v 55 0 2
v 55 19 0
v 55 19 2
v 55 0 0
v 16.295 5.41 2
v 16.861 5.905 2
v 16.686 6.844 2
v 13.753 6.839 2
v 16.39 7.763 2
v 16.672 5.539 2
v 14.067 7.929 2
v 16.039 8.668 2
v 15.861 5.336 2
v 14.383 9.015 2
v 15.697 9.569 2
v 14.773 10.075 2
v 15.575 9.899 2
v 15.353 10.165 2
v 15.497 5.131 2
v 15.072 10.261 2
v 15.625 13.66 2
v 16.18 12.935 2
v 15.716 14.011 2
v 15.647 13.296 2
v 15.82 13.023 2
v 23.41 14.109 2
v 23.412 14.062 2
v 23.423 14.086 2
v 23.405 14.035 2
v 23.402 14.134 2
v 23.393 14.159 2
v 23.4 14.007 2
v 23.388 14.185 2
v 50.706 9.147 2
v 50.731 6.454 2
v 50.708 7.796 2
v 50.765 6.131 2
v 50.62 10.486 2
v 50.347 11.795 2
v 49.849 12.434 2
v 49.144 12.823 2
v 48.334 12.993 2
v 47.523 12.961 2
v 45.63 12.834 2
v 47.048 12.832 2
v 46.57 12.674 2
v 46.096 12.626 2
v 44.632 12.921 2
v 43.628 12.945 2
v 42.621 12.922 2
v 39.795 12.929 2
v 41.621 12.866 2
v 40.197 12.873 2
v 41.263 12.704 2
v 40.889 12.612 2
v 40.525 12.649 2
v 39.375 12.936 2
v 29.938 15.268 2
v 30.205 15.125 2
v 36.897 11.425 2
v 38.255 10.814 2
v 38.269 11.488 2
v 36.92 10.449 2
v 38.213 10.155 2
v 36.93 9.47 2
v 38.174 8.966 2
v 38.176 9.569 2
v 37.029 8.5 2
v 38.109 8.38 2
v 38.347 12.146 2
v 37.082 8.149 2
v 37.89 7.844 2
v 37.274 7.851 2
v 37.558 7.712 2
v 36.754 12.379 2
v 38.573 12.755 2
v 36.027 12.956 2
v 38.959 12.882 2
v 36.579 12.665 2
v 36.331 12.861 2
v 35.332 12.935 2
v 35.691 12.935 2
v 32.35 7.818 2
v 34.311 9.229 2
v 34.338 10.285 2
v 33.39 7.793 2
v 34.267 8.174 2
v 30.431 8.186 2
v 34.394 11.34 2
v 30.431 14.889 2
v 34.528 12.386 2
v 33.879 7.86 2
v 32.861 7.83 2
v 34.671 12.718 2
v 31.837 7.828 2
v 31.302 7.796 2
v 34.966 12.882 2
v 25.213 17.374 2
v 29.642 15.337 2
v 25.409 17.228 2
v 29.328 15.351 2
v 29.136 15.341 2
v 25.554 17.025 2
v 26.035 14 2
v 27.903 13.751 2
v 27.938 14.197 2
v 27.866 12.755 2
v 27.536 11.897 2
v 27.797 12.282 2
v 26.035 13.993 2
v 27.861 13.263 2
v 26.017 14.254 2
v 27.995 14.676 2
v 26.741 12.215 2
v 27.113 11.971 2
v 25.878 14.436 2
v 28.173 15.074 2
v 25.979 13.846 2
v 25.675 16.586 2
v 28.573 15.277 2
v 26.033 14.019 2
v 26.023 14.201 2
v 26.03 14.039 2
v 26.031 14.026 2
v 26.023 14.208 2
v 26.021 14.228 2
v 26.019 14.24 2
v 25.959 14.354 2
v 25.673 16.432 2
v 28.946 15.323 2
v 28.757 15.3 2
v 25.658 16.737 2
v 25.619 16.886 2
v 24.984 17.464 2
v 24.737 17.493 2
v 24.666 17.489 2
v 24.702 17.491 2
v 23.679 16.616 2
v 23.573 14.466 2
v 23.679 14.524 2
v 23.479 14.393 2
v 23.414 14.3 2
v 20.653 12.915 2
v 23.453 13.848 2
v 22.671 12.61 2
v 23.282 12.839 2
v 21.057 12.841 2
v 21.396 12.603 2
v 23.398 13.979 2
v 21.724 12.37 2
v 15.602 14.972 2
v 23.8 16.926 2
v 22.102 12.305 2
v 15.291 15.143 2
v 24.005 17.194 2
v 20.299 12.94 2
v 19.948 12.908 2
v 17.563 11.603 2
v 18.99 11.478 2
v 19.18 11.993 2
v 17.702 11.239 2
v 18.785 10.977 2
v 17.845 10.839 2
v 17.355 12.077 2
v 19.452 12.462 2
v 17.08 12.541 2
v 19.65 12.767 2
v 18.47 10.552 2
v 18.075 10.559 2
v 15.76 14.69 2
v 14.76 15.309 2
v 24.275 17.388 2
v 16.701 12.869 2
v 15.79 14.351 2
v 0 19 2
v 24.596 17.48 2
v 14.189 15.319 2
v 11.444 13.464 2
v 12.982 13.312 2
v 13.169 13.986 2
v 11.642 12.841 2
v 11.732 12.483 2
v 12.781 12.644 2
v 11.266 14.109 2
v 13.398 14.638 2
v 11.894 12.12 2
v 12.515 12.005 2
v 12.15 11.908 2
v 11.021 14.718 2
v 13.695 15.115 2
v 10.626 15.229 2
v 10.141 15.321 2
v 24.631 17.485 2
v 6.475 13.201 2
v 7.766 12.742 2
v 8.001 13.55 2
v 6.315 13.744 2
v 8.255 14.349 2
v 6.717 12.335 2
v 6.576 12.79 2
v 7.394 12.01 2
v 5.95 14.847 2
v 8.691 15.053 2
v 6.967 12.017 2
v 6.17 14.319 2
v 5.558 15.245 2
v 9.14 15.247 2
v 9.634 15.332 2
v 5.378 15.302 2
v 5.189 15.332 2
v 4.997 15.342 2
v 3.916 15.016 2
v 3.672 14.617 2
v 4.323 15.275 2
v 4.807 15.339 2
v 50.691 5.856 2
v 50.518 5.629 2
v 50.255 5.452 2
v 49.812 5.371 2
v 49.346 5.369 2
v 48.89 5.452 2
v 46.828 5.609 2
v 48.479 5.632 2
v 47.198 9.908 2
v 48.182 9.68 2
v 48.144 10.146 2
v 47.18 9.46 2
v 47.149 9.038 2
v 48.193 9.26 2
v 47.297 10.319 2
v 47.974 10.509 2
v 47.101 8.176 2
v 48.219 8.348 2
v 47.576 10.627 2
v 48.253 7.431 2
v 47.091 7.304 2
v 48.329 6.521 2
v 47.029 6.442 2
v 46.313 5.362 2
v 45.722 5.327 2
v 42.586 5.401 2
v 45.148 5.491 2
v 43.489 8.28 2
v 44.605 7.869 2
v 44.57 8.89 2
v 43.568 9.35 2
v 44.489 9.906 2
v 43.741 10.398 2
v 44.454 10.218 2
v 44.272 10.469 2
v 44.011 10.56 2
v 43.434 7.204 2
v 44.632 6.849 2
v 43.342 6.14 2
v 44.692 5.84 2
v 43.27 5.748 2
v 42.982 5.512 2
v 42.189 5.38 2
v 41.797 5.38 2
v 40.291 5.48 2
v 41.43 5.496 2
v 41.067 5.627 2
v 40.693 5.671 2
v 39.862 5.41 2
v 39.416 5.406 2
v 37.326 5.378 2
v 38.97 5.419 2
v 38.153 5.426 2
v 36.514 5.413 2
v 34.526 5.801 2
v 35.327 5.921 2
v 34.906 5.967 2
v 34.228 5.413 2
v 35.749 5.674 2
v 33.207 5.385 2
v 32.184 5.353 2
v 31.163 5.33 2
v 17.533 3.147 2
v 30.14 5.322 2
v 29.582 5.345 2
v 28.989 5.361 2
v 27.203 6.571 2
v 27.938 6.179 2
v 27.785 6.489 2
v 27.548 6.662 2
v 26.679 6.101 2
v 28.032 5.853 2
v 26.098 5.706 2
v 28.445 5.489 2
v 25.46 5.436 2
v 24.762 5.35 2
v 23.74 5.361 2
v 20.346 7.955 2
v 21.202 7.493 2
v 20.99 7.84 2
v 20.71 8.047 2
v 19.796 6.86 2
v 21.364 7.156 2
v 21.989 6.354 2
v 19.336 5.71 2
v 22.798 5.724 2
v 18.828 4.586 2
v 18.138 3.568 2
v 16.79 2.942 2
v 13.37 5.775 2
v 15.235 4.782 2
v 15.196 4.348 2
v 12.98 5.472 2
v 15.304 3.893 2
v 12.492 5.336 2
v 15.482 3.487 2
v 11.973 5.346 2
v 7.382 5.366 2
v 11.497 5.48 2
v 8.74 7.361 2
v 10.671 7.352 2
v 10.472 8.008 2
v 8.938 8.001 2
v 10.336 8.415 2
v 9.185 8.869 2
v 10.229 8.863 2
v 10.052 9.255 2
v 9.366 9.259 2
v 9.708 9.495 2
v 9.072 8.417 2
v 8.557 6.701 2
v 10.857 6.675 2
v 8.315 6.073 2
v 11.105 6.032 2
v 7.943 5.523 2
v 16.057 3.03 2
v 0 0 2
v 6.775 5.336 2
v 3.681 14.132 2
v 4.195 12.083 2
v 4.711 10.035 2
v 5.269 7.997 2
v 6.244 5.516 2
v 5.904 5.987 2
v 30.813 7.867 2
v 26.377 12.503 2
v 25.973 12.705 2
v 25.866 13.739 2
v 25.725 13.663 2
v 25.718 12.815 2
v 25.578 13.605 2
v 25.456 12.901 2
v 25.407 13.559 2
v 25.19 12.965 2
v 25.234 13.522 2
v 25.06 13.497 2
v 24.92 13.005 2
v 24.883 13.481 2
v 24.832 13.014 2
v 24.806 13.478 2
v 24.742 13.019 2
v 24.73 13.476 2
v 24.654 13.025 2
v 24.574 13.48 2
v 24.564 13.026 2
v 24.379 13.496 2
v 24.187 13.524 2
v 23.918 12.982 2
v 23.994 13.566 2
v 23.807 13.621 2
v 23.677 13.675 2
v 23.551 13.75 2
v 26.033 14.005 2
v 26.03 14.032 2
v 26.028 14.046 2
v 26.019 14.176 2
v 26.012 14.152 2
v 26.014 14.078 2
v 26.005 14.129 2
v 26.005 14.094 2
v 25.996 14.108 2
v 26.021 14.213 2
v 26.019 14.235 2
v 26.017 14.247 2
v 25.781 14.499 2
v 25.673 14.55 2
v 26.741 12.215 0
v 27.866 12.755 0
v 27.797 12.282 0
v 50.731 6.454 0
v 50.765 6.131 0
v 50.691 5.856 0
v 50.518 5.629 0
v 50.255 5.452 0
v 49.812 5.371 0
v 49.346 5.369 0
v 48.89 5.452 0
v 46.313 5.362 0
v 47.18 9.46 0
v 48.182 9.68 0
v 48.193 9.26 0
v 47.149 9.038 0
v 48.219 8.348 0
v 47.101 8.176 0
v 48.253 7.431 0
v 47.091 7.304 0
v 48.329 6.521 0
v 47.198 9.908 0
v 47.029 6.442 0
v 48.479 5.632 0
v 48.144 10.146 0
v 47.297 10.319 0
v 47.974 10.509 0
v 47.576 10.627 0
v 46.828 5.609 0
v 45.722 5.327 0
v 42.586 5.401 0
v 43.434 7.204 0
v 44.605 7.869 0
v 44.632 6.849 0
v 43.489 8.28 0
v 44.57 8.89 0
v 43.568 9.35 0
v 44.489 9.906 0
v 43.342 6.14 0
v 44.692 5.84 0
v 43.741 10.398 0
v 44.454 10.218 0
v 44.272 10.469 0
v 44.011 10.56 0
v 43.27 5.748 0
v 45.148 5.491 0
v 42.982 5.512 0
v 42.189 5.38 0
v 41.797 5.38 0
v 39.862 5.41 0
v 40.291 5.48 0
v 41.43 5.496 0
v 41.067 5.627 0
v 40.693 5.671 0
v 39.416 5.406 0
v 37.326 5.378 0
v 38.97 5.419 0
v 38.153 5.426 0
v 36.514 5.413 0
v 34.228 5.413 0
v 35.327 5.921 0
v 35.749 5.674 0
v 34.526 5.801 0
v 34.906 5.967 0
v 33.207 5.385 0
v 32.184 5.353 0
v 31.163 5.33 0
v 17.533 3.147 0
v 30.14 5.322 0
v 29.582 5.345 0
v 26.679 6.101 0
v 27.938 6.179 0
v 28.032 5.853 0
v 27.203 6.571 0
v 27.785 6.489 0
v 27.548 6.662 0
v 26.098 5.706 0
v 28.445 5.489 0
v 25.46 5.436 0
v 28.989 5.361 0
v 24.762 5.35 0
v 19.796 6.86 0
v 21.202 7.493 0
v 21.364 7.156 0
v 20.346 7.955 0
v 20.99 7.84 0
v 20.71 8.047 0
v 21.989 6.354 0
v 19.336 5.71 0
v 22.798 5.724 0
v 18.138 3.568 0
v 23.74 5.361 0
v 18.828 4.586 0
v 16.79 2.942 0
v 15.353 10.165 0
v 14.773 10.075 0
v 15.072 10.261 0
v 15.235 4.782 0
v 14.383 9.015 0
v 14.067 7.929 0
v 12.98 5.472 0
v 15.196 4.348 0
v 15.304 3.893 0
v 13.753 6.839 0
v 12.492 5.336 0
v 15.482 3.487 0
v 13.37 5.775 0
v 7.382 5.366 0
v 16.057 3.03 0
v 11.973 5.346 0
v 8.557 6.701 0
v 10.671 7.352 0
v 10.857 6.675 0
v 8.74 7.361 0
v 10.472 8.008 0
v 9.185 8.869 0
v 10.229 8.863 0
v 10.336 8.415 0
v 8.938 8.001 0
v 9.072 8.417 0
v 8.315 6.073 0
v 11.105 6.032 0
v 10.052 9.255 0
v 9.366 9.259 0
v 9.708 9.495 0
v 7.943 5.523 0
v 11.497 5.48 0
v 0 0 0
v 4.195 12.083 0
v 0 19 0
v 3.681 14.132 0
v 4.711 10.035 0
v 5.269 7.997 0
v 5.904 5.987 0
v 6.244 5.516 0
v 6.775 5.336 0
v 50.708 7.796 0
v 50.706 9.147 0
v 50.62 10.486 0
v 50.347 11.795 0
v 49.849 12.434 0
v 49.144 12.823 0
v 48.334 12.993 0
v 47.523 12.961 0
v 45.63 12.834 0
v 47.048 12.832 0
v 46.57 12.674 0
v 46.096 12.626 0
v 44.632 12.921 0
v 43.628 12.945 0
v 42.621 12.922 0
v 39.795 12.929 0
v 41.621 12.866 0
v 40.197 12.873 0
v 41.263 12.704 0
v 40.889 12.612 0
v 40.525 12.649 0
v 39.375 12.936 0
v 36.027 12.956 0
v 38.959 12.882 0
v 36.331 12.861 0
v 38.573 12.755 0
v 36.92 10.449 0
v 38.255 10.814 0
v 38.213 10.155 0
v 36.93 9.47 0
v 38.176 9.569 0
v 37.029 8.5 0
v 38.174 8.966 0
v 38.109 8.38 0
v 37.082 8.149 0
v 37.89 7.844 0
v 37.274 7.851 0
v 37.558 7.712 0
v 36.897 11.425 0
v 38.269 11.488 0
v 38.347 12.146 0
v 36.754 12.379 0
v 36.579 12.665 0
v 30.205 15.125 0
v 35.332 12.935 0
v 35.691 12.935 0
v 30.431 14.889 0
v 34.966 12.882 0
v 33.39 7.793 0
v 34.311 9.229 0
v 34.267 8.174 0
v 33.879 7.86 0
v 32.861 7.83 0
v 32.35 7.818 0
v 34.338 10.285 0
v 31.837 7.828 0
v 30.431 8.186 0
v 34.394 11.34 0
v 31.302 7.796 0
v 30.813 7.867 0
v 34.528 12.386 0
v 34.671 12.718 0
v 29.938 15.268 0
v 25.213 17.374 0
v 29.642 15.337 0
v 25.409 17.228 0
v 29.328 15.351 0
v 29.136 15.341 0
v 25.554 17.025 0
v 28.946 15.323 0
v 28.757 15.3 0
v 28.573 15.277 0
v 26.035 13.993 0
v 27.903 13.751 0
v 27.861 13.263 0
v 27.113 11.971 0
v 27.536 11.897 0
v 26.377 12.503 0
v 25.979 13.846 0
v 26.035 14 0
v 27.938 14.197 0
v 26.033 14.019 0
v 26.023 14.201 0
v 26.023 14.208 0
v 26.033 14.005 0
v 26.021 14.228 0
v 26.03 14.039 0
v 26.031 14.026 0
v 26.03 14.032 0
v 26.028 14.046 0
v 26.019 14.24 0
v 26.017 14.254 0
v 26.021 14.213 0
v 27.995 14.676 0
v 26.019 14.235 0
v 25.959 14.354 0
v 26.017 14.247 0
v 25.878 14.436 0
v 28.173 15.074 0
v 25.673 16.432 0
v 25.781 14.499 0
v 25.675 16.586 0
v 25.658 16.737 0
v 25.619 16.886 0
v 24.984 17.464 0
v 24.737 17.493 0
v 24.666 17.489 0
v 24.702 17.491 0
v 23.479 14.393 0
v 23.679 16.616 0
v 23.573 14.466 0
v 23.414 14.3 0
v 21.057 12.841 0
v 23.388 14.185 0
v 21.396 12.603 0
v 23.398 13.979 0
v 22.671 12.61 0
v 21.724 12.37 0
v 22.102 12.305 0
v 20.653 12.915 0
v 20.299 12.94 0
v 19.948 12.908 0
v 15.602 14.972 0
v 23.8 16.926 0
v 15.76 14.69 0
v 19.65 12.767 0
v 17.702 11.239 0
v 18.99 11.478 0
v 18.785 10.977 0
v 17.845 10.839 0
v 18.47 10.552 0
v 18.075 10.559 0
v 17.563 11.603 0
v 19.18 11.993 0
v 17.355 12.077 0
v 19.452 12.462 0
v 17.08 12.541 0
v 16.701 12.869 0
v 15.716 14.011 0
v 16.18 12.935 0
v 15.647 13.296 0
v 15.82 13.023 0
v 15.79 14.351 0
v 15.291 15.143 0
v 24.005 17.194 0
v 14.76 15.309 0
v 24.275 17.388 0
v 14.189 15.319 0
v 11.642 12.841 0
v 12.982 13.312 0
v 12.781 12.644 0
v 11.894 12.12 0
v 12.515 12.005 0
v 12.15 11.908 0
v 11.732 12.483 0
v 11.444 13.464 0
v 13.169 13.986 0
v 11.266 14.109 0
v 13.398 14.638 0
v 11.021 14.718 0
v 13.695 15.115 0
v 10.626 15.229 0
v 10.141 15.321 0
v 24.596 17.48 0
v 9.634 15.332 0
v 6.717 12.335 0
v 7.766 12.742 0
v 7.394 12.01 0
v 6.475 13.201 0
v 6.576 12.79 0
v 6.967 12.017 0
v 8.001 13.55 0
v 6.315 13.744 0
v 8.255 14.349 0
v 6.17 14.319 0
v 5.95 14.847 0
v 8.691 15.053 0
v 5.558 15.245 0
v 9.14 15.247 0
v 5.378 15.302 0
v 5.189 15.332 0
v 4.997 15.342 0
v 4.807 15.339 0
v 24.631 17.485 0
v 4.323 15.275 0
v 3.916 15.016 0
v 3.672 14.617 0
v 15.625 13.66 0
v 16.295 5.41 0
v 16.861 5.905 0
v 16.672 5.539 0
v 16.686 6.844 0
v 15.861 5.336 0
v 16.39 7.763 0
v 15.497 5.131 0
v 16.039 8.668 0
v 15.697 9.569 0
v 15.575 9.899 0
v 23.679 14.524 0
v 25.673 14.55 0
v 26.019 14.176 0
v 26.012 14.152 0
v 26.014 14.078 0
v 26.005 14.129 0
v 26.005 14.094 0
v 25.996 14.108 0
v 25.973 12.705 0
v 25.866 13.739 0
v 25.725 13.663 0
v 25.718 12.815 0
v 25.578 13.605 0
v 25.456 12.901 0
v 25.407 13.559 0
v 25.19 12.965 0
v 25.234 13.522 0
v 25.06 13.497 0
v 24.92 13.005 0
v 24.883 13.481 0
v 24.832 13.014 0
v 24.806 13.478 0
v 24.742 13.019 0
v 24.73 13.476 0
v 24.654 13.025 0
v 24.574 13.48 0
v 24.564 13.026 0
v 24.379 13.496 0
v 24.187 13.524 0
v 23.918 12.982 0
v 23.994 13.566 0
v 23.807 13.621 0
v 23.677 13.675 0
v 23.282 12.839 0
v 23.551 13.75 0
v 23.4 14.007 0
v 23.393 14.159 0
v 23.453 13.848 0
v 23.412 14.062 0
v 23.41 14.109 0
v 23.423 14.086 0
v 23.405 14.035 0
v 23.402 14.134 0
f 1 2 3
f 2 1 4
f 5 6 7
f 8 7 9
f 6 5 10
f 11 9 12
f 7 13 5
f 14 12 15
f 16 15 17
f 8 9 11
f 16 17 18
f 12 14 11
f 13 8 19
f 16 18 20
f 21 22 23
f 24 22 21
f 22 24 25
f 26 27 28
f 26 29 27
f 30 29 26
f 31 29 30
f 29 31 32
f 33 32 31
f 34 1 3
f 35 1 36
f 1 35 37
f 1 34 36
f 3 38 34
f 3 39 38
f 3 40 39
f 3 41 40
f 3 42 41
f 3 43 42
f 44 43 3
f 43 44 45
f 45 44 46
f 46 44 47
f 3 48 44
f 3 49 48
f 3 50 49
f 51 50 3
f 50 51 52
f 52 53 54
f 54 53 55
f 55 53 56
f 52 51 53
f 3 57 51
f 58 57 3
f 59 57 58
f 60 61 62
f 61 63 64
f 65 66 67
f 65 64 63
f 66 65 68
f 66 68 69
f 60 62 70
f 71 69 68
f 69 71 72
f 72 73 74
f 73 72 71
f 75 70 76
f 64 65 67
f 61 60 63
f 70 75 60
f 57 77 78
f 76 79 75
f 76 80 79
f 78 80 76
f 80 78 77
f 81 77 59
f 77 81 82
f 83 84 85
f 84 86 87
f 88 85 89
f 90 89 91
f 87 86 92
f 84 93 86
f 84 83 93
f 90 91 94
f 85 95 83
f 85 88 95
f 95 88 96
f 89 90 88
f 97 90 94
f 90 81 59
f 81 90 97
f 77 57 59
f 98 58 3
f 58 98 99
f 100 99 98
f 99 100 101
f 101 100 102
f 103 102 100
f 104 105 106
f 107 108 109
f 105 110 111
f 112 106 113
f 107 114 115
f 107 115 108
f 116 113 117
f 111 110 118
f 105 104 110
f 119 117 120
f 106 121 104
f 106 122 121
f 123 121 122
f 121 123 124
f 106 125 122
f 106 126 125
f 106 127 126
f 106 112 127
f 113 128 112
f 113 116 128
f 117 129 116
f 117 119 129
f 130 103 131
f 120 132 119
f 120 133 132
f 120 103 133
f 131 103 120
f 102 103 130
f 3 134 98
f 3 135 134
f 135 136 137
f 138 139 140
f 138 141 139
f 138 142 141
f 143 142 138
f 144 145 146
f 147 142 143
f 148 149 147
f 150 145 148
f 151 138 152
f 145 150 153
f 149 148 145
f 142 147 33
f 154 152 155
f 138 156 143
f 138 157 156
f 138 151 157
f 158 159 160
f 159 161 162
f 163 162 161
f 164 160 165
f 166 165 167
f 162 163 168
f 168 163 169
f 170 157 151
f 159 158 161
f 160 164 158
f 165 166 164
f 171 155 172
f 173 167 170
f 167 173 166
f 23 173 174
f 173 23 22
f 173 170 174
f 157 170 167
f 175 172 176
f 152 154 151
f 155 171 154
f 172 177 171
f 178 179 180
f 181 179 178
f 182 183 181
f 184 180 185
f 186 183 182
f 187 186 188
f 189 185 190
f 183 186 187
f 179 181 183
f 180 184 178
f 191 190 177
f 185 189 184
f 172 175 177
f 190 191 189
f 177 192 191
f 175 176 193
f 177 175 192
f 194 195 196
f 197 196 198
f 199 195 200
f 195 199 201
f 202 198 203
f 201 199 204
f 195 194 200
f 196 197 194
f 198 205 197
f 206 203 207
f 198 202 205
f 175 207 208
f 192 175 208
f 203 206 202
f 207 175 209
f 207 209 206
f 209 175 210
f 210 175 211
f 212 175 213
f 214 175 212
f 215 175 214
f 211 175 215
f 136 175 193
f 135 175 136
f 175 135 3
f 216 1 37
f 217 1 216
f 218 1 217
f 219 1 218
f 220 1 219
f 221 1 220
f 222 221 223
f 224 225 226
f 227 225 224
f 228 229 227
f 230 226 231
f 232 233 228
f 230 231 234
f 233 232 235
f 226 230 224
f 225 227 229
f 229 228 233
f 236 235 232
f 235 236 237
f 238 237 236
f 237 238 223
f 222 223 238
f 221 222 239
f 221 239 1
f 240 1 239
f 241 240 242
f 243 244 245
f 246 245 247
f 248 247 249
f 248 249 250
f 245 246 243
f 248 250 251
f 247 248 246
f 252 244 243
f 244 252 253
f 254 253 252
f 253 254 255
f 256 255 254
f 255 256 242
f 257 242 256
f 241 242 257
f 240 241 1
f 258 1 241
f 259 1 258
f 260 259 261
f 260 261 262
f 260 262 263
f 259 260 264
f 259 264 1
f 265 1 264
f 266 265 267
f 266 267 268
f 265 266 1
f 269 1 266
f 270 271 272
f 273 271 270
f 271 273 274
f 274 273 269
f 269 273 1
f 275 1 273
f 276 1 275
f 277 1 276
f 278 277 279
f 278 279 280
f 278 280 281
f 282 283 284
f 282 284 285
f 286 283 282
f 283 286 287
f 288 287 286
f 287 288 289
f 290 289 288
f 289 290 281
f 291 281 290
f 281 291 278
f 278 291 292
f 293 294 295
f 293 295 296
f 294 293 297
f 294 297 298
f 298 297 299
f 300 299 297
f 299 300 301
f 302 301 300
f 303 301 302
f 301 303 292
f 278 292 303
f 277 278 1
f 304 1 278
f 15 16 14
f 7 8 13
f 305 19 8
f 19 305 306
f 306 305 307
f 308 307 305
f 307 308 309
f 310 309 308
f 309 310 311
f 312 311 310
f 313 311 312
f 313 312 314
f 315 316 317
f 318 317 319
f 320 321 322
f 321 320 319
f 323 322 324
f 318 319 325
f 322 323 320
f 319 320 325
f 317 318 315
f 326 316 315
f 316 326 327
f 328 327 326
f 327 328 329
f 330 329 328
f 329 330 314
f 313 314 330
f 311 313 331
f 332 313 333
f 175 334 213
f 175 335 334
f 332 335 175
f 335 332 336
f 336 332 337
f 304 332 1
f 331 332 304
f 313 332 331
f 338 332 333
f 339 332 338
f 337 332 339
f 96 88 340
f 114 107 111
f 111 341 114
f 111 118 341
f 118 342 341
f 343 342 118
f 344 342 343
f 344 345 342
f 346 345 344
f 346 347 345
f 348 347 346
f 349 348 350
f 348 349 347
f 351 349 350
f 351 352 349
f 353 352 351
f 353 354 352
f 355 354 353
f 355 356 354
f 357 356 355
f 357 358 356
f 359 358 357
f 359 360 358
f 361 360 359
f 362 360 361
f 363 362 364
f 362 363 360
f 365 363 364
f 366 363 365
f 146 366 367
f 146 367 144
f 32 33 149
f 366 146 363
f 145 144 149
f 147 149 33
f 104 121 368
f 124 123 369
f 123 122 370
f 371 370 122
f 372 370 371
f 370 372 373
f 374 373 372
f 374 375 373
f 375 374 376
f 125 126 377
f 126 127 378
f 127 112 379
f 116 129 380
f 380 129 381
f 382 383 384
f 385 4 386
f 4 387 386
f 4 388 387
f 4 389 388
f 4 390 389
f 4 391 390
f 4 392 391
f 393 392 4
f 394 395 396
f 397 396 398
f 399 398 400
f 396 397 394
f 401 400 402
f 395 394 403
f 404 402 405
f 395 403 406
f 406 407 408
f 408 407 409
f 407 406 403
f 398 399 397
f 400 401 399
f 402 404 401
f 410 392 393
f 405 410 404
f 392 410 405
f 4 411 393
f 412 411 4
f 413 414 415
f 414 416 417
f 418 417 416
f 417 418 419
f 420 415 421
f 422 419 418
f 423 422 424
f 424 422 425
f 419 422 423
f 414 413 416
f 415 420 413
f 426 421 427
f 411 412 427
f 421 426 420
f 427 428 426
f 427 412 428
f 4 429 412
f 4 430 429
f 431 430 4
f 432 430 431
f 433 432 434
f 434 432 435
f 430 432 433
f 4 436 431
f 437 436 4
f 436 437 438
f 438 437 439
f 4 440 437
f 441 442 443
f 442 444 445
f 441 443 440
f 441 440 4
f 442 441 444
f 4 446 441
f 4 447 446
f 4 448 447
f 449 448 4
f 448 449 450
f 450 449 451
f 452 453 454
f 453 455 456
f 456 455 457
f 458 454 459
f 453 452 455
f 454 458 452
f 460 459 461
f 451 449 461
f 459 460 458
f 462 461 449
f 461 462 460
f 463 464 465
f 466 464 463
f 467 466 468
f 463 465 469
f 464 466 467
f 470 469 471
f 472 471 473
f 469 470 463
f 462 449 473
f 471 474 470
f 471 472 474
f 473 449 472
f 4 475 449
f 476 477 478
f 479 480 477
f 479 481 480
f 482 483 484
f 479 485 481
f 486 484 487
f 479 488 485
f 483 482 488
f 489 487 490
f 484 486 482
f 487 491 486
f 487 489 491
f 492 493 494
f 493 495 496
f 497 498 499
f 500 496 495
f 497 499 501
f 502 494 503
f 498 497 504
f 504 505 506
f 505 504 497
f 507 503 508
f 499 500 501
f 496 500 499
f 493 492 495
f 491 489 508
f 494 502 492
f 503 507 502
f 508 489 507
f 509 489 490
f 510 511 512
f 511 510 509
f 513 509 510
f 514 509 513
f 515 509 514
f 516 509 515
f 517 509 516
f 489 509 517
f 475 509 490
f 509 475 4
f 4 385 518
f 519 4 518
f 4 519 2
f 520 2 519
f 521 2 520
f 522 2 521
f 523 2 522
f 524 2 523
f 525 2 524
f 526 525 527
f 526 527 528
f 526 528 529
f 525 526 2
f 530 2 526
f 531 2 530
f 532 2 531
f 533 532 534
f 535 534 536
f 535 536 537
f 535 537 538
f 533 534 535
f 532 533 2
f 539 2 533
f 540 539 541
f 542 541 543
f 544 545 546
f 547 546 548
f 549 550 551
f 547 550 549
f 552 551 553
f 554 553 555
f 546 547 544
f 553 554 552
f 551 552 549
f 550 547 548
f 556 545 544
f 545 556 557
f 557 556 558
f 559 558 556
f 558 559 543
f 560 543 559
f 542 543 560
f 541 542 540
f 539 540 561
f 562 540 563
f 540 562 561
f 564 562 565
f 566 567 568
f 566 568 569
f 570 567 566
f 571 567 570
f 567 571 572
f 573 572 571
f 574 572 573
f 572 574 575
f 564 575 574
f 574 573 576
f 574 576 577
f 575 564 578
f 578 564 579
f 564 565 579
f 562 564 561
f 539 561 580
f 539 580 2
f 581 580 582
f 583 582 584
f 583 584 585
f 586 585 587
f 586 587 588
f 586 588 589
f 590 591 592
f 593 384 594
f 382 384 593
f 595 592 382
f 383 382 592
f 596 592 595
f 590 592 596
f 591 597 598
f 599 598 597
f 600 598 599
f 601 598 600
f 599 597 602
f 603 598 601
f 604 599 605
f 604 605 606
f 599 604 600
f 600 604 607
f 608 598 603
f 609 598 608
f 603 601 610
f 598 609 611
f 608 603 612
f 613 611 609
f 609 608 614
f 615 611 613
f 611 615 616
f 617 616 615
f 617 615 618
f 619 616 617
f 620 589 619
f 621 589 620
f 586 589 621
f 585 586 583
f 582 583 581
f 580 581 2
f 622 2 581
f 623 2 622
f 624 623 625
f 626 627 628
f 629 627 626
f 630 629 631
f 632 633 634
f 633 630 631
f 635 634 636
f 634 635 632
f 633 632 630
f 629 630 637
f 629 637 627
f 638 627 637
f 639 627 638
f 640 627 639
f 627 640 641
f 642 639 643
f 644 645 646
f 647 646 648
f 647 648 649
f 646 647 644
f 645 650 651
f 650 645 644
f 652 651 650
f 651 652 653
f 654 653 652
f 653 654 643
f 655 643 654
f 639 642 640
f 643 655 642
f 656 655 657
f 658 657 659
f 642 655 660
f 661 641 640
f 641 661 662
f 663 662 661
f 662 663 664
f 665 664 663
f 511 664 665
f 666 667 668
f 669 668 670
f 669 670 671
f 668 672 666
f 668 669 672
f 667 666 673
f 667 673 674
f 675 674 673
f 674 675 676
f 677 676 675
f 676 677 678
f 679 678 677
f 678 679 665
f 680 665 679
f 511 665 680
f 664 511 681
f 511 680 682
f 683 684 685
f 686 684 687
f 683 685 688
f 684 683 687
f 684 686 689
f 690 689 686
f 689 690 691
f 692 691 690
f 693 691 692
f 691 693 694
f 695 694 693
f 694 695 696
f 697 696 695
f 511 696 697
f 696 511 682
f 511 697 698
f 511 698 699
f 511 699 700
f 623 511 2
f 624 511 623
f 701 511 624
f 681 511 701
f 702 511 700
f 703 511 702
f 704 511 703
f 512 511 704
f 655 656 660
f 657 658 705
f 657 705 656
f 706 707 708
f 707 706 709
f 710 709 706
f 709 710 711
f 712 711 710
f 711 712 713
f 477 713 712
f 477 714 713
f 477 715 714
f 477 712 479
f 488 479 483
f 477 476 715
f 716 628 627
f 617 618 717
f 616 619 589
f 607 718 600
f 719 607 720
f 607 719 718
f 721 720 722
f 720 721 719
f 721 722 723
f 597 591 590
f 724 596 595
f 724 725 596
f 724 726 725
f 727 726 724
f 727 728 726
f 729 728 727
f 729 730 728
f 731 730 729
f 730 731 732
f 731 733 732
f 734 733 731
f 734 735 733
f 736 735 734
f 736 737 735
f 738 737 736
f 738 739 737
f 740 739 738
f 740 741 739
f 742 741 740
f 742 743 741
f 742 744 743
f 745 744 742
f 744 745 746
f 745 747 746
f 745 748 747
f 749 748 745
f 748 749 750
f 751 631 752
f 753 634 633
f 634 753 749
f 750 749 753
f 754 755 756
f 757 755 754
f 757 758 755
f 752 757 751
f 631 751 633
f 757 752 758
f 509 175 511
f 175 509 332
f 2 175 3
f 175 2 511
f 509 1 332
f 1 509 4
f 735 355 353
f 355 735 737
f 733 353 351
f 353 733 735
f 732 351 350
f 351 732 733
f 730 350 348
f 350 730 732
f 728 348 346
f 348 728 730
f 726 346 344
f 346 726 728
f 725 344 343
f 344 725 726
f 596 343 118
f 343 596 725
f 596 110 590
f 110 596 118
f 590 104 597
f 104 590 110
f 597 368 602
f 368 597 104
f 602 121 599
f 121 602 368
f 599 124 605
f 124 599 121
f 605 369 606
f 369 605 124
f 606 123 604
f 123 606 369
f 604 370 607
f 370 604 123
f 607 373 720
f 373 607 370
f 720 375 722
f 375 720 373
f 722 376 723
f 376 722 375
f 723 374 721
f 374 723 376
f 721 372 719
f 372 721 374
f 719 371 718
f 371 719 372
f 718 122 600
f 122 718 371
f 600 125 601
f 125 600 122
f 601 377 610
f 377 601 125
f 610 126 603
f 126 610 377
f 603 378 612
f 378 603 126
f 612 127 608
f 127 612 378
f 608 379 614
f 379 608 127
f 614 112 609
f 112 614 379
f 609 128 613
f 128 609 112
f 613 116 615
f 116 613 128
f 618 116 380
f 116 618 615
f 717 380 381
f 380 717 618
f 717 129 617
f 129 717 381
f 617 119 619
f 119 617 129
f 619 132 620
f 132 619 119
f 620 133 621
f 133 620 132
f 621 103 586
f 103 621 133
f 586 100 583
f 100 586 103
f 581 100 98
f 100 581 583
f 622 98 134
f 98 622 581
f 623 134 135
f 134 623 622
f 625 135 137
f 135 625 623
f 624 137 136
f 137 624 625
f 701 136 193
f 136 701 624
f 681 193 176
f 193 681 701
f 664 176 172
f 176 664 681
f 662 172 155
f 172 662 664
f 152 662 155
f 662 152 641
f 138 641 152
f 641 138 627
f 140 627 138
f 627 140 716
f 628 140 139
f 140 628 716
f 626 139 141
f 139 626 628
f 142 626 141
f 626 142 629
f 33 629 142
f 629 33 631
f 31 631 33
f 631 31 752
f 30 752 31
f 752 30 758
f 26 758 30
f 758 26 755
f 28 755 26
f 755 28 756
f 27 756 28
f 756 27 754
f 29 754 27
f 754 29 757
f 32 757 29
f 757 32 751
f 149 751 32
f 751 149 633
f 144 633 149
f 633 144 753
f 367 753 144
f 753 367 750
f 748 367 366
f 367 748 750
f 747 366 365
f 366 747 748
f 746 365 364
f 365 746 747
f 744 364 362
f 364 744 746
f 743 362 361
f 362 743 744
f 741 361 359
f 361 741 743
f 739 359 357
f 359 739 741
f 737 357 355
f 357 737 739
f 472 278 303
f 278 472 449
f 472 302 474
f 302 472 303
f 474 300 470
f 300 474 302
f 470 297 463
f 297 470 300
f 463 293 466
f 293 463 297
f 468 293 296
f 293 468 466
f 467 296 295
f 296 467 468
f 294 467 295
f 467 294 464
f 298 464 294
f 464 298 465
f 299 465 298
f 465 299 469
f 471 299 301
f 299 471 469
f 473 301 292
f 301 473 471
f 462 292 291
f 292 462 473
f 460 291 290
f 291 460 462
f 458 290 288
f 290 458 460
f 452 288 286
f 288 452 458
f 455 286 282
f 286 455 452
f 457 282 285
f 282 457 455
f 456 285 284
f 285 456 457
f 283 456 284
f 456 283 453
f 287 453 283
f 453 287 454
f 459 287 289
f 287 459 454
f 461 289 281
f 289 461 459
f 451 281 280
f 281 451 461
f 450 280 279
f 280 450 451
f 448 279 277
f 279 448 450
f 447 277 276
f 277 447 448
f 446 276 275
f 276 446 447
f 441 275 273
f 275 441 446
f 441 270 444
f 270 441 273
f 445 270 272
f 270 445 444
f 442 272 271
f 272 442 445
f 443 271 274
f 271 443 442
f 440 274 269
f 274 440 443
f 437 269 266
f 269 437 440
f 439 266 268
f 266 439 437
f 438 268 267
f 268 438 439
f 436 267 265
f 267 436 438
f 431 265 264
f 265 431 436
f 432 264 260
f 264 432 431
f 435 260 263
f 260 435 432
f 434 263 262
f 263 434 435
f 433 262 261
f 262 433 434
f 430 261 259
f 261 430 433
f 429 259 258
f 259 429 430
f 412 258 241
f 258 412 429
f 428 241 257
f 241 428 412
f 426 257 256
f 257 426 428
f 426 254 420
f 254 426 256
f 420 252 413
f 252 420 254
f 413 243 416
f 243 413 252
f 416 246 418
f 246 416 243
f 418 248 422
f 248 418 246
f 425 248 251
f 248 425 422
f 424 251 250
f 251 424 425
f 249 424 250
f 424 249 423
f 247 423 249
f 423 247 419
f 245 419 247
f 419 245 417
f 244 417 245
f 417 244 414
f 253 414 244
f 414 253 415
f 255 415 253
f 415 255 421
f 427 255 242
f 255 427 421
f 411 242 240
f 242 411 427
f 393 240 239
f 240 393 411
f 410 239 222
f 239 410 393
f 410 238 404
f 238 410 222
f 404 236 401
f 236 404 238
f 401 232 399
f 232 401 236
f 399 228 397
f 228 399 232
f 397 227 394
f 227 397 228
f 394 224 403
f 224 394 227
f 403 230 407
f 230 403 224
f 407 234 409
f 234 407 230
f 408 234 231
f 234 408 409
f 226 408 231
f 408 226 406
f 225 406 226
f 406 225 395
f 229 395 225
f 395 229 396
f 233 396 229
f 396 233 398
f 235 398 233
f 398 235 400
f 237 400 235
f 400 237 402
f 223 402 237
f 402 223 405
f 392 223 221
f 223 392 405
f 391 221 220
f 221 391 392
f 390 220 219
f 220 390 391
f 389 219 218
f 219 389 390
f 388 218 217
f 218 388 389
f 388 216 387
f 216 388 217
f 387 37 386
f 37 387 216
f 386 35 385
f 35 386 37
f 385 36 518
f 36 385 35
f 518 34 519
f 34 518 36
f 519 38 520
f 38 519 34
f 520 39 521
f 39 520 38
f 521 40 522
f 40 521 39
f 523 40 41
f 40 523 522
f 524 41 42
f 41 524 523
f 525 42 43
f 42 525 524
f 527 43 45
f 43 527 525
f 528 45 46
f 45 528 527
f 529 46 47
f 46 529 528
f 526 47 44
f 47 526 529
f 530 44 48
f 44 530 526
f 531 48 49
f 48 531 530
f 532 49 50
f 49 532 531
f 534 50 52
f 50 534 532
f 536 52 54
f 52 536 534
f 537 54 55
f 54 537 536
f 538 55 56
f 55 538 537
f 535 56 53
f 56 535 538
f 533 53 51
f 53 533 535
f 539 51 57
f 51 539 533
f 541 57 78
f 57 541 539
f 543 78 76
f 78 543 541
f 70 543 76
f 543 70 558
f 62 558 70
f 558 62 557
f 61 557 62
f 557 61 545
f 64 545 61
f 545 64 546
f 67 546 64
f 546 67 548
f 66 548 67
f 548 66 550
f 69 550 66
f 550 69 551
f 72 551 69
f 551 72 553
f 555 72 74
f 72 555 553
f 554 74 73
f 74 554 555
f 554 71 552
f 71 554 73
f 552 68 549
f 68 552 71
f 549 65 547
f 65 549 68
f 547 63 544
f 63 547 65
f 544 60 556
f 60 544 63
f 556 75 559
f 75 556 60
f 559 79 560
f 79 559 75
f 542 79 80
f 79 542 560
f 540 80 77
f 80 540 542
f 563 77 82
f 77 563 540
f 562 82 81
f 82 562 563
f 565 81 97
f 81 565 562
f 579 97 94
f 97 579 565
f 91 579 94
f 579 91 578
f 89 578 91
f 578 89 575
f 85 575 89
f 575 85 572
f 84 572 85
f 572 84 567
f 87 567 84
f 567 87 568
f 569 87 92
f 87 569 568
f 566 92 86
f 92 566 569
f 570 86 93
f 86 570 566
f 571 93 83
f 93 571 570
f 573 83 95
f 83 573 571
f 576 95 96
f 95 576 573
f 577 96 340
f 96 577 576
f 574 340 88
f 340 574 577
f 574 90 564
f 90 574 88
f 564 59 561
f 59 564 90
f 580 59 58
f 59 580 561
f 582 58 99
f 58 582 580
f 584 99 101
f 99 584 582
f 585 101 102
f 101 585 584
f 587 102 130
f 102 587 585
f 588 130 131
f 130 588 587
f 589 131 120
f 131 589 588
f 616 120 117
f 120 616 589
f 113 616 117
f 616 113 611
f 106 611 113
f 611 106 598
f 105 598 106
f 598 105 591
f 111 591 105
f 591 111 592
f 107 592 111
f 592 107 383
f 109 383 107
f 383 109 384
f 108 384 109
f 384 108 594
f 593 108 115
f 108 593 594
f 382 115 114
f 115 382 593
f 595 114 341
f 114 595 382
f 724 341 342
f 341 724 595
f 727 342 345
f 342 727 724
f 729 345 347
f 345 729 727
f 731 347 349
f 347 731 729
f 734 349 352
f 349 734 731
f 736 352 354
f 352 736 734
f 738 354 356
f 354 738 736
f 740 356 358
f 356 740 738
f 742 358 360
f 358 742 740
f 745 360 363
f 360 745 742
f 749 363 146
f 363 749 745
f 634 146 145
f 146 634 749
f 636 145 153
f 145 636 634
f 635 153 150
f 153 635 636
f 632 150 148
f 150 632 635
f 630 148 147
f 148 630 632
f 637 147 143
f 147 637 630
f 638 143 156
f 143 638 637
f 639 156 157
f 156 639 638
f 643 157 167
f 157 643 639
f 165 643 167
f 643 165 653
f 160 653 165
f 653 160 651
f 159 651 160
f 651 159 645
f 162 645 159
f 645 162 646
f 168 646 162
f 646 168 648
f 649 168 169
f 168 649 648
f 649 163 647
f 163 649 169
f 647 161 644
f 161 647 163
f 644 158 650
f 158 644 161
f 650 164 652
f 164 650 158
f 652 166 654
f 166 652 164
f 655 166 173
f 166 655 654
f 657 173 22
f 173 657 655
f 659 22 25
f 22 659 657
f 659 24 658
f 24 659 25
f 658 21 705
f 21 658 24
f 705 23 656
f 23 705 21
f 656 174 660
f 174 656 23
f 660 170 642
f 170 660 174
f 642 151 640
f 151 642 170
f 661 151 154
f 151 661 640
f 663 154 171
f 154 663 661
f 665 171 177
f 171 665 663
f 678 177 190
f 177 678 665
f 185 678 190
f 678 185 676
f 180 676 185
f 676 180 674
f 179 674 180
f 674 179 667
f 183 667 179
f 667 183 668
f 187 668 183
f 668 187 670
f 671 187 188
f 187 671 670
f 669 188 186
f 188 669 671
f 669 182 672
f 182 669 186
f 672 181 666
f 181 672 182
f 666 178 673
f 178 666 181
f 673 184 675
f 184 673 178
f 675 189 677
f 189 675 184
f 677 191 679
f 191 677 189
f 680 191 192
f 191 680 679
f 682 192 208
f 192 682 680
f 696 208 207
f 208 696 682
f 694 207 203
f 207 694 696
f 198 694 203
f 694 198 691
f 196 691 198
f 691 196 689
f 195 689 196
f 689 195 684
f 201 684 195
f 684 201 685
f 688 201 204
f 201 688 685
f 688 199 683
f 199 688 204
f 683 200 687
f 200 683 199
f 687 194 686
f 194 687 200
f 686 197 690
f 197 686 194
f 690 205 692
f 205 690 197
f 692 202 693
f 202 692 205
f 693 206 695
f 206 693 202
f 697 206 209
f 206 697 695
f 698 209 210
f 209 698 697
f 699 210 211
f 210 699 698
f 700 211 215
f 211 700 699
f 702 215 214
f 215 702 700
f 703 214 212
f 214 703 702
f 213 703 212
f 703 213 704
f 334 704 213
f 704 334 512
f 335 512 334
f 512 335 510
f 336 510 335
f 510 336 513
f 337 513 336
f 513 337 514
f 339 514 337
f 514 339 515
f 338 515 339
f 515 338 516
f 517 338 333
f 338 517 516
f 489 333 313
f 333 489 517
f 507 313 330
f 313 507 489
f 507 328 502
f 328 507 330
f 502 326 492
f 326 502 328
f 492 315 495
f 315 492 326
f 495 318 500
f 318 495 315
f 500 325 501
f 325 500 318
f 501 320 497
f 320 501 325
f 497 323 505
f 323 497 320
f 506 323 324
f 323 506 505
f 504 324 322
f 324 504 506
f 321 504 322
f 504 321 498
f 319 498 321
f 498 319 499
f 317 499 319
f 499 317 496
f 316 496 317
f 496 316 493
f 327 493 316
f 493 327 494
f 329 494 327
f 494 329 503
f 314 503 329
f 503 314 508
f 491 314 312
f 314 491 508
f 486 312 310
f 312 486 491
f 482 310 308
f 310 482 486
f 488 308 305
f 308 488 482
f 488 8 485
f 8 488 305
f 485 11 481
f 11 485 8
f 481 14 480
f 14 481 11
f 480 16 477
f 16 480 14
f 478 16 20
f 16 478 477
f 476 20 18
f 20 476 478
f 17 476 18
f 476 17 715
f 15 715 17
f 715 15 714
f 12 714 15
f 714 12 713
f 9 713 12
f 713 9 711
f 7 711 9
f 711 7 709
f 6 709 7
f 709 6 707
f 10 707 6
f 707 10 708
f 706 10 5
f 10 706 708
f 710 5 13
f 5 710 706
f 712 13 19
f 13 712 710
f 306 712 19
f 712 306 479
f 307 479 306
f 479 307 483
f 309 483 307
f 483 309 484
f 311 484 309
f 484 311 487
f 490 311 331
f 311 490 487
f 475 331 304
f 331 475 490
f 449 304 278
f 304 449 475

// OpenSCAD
difference(){
	cube([55,19,2]);
	translate([0,0,0])scale([.2,.2,.2])linear_extrude(height=10)import("wyologo2.dxf");
}
